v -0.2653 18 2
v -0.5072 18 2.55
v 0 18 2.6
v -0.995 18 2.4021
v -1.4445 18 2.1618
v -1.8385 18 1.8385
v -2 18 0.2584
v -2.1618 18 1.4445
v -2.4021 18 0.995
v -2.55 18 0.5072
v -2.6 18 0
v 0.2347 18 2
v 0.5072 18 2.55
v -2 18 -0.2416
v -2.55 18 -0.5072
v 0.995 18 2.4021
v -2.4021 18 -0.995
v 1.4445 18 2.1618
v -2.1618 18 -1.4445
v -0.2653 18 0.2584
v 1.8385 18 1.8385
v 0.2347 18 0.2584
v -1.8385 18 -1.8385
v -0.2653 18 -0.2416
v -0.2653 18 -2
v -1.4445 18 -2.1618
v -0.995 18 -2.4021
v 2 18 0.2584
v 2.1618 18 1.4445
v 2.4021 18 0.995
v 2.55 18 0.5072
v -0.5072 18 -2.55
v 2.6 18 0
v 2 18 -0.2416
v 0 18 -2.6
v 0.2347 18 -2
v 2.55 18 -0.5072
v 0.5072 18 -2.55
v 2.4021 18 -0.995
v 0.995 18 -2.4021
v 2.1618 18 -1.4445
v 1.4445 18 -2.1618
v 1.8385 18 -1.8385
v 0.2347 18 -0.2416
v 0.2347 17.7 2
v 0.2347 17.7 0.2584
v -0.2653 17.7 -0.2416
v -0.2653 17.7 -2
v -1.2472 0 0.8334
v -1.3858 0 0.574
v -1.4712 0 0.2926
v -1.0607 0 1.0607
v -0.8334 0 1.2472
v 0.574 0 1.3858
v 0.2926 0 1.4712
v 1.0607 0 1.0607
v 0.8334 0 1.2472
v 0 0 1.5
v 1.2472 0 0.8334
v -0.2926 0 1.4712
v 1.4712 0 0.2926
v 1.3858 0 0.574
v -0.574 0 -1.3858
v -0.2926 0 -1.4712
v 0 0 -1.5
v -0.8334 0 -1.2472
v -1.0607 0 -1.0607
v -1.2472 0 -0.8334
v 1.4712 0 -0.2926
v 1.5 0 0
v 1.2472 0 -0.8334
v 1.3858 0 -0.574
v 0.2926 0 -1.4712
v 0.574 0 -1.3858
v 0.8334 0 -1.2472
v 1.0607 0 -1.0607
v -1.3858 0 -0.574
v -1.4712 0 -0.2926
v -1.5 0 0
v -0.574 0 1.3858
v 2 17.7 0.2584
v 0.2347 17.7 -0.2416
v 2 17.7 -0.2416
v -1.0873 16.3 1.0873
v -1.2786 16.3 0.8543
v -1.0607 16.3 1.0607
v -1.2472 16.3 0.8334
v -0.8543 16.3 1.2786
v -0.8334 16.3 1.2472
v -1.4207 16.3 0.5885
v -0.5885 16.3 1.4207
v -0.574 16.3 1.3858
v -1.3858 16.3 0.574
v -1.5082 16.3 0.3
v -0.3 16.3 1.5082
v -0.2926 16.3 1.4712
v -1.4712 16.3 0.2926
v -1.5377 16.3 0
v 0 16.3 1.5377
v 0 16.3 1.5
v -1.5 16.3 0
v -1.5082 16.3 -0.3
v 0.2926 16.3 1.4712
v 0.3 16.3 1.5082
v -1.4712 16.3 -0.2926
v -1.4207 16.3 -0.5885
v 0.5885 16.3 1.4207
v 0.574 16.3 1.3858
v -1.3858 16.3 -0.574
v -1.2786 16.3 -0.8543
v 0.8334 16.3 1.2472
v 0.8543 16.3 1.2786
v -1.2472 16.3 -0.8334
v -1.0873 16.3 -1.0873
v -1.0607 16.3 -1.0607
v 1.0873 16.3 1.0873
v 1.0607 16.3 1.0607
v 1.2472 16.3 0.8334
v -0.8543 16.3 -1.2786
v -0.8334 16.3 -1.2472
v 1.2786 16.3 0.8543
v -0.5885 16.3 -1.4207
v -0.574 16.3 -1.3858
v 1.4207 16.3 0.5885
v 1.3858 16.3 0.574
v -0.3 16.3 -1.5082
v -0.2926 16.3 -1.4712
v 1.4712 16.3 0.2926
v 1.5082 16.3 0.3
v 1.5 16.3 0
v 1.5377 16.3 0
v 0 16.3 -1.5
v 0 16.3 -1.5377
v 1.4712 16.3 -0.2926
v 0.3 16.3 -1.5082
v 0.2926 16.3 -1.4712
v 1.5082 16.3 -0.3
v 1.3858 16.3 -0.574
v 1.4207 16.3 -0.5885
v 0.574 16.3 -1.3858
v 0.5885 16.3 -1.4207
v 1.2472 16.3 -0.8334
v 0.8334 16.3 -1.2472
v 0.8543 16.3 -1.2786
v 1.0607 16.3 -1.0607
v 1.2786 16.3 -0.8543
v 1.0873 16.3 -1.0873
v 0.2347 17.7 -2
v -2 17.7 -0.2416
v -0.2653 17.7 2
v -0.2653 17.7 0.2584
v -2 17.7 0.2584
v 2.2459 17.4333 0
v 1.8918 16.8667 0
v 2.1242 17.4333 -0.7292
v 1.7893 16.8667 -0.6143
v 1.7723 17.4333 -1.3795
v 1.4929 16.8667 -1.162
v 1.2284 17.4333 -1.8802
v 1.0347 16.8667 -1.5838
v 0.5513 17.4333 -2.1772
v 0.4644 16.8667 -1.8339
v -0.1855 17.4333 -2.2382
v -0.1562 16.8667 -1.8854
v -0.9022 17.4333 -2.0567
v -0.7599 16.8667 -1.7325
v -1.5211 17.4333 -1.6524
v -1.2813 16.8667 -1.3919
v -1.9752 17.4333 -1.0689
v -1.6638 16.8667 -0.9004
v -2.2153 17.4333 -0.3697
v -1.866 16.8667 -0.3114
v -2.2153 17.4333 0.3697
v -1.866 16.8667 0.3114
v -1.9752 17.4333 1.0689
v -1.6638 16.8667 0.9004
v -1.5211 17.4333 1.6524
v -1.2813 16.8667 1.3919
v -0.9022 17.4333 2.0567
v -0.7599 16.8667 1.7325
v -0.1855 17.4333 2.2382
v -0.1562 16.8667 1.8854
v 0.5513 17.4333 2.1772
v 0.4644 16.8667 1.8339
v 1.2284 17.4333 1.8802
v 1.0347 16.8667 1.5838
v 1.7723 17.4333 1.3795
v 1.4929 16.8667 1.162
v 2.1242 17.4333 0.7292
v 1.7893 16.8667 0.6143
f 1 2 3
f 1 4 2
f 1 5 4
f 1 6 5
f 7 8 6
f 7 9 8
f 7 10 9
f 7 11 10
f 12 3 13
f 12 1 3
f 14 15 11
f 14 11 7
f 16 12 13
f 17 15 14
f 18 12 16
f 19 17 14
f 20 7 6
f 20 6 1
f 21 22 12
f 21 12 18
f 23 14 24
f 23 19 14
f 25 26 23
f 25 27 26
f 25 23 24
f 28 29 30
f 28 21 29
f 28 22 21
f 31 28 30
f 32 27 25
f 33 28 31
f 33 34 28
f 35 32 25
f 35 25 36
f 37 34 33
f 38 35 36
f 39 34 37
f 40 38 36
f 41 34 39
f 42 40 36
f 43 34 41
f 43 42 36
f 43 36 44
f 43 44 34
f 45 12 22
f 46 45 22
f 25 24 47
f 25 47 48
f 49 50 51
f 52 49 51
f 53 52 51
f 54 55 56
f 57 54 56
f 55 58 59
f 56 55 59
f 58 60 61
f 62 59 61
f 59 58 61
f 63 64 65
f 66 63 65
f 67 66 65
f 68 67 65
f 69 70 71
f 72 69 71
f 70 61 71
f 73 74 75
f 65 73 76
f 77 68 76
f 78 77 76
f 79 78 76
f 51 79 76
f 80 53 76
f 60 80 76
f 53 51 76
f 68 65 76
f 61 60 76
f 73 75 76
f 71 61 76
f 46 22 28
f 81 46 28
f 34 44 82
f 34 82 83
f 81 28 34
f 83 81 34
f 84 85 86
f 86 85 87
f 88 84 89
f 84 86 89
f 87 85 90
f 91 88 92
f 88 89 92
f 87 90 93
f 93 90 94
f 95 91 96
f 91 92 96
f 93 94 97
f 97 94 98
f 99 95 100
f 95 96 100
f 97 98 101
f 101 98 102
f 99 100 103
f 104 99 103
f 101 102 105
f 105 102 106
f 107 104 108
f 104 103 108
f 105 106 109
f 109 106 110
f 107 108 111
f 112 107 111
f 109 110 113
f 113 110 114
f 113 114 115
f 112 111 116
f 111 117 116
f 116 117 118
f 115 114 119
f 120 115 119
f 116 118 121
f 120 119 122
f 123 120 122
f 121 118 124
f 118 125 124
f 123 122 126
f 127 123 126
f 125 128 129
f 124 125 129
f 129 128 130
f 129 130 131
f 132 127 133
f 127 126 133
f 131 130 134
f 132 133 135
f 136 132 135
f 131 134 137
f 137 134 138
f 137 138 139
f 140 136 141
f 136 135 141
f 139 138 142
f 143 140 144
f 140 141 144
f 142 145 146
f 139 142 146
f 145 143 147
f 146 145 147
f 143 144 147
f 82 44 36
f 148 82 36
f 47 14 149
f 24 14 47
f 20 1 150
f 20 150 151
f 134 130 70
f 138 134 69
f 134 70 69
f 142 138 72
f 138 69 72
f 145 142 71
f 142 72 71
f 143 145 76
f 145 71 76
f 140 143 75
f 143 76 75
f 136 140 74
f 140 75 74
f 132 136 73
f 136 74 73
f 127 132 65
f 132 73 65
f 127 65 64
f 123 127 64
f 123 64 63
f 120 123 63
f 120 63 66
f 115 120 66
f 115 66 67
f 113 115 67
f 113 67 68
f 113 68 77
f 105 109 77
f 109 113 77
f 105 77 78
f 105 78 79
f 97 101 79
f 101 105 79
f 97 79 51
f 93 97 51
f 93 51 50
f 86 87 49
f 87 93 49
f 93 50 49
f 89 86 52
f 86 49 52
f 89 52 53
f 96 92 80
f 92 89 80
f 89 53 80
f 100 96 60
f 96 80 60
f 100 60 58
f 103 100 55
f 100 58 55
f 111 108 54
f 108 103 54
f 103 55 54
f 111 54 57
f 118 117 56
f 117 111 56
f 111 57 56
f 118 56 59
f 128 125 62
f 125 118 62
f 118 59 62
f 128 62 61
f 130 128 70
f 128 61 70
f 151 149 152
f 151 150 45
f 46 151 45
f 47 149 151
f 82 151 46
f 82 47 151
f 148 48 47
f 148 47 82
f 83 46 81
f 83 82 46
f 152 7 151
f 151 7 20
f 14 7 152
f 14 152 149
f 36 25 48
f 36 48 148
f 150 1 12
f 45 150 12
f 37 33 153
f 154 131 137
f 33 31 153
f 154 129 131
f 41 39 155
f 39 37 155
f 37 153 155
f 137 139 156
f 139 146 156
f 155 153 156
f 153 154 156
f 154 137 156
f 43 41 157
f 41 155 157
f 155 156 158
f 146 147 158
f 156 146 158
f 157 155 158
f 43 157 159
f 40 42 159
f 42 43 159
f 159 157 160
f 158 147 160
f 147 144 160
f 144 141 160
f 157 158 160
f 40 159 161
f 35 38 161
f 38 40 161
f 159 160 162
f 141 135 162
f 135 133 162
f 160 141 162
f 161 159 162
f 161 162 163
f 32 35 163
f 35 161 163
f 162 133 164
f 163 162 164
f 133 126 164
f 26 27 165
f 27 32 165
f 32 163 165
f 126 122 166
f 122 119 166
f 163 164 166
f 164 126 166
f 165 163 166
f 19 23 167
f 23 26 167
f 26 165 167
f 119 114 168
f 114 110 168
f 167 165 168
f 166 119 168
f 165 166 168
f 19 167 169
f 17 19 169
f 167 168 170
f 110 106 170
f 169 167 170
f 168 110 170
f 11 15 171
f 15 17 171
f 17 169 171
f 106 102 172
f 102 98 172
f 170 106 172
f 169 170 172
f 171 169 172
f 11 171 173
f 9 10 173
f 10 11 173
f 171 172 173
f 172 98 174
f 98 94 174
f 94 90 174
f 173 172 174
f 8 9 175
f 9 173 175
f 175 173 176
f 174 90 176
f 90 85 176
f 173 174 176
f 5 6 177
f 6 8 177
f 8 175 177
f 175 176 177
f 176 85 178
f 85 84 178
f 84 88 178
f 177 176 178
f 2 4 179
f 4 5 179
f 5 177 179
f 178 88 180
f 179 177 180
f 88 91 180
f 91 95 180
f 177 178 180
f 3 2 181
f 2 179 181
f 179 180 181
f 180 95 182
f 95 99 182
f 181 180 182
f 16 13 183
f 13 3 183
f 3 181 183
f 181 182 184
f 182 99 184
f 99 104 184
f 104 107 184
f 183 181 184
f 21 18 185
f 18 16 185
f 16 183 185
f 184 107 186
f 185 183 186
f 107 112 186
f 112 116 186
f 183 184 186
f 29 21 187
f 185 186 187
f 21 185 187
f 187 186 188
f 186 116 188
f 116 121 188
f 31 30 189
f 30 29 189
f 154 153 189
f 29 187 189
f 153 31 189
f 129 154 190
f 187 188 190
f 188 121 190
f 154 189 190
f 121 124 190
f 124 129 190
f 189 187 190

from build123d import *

# Parameters (mm, degrees)
SKETCH1_R           = 1.5
BOSS_EXTRUDE1_DEPTH = 18
SKETCH2_R           = 2.6
BOSS_EXTRUDE2_DEPTH = 1.7
BOSS_EXTRUDE2_TAPER = 32
SKETCH3_W           = 0.5
SKETCH3_H           = 1.758378485
SKETCH3_H_2         = 1.741621515
SKETCH3_W_2         = 1.734727157
SKETCH3_H_3         = 0.5
SKETCH3_W_3         = 1.765272843
CUT_EXTRUDE1_DEPTH  = 0.3


with BuildPart() as part:
    # Sketch1 → Boss-Extrude1 (new body)
    with BuildSketch(Plane(origin=(0, 0, 0), x_dir=(1, 0, 0), z_dir=(0, 1, 0))):
        Circle(SKETCH1_R)
    extrude(amount=BOSS_EXTRUDE1_DEPTH)

    # Sketch2 → Boss-Extrude2 (add)
    with BuildSketch(Plane(origin=(0, 18, 0), x_dir=(1, 0, 0), z_dir=(0, 1, 0))):
        Circle(SKETCH2_R)
    extrude(amount=-BOSS_EXTRUDE2_DEPTH, taper=BOSS_EXTRUDE2_TAPER)

    # Sketch3 → Cut-Extrude1 (cut)
    with BuildSketch(Plane(origin=(0, 18, 0), x_dir=(1, 0, 0), z_dir=(0, 1, 0))):
        with Locations((-0.015272843, 1.120810757)):
            Rectangle(SKETCH3_W, SKETCH3_H)
        with Locations((-0.015272843, -1.129189243)):
            Rectangle(SKETCH3_W, SKETCH3_H_2)
        with Locations((-1.132636421, -0.008378485)):
            Rectangle(SKETCH3_W_2, SKETCH3_H_3)
        with Locations((1.117363579, -0.008378485)):
            Rectangle(SKETCH3_W_3, SKETCH3_H_3)
        with Locations((-0.015272843, -0.008378485)):
            Rectangle(SKETCH3_W, SKETCH3_H_3)
    extrude(amount=-CUT_EXTRUDE1_DEPTH, mode=Mode.SUBTRACT)


solid = part.part
